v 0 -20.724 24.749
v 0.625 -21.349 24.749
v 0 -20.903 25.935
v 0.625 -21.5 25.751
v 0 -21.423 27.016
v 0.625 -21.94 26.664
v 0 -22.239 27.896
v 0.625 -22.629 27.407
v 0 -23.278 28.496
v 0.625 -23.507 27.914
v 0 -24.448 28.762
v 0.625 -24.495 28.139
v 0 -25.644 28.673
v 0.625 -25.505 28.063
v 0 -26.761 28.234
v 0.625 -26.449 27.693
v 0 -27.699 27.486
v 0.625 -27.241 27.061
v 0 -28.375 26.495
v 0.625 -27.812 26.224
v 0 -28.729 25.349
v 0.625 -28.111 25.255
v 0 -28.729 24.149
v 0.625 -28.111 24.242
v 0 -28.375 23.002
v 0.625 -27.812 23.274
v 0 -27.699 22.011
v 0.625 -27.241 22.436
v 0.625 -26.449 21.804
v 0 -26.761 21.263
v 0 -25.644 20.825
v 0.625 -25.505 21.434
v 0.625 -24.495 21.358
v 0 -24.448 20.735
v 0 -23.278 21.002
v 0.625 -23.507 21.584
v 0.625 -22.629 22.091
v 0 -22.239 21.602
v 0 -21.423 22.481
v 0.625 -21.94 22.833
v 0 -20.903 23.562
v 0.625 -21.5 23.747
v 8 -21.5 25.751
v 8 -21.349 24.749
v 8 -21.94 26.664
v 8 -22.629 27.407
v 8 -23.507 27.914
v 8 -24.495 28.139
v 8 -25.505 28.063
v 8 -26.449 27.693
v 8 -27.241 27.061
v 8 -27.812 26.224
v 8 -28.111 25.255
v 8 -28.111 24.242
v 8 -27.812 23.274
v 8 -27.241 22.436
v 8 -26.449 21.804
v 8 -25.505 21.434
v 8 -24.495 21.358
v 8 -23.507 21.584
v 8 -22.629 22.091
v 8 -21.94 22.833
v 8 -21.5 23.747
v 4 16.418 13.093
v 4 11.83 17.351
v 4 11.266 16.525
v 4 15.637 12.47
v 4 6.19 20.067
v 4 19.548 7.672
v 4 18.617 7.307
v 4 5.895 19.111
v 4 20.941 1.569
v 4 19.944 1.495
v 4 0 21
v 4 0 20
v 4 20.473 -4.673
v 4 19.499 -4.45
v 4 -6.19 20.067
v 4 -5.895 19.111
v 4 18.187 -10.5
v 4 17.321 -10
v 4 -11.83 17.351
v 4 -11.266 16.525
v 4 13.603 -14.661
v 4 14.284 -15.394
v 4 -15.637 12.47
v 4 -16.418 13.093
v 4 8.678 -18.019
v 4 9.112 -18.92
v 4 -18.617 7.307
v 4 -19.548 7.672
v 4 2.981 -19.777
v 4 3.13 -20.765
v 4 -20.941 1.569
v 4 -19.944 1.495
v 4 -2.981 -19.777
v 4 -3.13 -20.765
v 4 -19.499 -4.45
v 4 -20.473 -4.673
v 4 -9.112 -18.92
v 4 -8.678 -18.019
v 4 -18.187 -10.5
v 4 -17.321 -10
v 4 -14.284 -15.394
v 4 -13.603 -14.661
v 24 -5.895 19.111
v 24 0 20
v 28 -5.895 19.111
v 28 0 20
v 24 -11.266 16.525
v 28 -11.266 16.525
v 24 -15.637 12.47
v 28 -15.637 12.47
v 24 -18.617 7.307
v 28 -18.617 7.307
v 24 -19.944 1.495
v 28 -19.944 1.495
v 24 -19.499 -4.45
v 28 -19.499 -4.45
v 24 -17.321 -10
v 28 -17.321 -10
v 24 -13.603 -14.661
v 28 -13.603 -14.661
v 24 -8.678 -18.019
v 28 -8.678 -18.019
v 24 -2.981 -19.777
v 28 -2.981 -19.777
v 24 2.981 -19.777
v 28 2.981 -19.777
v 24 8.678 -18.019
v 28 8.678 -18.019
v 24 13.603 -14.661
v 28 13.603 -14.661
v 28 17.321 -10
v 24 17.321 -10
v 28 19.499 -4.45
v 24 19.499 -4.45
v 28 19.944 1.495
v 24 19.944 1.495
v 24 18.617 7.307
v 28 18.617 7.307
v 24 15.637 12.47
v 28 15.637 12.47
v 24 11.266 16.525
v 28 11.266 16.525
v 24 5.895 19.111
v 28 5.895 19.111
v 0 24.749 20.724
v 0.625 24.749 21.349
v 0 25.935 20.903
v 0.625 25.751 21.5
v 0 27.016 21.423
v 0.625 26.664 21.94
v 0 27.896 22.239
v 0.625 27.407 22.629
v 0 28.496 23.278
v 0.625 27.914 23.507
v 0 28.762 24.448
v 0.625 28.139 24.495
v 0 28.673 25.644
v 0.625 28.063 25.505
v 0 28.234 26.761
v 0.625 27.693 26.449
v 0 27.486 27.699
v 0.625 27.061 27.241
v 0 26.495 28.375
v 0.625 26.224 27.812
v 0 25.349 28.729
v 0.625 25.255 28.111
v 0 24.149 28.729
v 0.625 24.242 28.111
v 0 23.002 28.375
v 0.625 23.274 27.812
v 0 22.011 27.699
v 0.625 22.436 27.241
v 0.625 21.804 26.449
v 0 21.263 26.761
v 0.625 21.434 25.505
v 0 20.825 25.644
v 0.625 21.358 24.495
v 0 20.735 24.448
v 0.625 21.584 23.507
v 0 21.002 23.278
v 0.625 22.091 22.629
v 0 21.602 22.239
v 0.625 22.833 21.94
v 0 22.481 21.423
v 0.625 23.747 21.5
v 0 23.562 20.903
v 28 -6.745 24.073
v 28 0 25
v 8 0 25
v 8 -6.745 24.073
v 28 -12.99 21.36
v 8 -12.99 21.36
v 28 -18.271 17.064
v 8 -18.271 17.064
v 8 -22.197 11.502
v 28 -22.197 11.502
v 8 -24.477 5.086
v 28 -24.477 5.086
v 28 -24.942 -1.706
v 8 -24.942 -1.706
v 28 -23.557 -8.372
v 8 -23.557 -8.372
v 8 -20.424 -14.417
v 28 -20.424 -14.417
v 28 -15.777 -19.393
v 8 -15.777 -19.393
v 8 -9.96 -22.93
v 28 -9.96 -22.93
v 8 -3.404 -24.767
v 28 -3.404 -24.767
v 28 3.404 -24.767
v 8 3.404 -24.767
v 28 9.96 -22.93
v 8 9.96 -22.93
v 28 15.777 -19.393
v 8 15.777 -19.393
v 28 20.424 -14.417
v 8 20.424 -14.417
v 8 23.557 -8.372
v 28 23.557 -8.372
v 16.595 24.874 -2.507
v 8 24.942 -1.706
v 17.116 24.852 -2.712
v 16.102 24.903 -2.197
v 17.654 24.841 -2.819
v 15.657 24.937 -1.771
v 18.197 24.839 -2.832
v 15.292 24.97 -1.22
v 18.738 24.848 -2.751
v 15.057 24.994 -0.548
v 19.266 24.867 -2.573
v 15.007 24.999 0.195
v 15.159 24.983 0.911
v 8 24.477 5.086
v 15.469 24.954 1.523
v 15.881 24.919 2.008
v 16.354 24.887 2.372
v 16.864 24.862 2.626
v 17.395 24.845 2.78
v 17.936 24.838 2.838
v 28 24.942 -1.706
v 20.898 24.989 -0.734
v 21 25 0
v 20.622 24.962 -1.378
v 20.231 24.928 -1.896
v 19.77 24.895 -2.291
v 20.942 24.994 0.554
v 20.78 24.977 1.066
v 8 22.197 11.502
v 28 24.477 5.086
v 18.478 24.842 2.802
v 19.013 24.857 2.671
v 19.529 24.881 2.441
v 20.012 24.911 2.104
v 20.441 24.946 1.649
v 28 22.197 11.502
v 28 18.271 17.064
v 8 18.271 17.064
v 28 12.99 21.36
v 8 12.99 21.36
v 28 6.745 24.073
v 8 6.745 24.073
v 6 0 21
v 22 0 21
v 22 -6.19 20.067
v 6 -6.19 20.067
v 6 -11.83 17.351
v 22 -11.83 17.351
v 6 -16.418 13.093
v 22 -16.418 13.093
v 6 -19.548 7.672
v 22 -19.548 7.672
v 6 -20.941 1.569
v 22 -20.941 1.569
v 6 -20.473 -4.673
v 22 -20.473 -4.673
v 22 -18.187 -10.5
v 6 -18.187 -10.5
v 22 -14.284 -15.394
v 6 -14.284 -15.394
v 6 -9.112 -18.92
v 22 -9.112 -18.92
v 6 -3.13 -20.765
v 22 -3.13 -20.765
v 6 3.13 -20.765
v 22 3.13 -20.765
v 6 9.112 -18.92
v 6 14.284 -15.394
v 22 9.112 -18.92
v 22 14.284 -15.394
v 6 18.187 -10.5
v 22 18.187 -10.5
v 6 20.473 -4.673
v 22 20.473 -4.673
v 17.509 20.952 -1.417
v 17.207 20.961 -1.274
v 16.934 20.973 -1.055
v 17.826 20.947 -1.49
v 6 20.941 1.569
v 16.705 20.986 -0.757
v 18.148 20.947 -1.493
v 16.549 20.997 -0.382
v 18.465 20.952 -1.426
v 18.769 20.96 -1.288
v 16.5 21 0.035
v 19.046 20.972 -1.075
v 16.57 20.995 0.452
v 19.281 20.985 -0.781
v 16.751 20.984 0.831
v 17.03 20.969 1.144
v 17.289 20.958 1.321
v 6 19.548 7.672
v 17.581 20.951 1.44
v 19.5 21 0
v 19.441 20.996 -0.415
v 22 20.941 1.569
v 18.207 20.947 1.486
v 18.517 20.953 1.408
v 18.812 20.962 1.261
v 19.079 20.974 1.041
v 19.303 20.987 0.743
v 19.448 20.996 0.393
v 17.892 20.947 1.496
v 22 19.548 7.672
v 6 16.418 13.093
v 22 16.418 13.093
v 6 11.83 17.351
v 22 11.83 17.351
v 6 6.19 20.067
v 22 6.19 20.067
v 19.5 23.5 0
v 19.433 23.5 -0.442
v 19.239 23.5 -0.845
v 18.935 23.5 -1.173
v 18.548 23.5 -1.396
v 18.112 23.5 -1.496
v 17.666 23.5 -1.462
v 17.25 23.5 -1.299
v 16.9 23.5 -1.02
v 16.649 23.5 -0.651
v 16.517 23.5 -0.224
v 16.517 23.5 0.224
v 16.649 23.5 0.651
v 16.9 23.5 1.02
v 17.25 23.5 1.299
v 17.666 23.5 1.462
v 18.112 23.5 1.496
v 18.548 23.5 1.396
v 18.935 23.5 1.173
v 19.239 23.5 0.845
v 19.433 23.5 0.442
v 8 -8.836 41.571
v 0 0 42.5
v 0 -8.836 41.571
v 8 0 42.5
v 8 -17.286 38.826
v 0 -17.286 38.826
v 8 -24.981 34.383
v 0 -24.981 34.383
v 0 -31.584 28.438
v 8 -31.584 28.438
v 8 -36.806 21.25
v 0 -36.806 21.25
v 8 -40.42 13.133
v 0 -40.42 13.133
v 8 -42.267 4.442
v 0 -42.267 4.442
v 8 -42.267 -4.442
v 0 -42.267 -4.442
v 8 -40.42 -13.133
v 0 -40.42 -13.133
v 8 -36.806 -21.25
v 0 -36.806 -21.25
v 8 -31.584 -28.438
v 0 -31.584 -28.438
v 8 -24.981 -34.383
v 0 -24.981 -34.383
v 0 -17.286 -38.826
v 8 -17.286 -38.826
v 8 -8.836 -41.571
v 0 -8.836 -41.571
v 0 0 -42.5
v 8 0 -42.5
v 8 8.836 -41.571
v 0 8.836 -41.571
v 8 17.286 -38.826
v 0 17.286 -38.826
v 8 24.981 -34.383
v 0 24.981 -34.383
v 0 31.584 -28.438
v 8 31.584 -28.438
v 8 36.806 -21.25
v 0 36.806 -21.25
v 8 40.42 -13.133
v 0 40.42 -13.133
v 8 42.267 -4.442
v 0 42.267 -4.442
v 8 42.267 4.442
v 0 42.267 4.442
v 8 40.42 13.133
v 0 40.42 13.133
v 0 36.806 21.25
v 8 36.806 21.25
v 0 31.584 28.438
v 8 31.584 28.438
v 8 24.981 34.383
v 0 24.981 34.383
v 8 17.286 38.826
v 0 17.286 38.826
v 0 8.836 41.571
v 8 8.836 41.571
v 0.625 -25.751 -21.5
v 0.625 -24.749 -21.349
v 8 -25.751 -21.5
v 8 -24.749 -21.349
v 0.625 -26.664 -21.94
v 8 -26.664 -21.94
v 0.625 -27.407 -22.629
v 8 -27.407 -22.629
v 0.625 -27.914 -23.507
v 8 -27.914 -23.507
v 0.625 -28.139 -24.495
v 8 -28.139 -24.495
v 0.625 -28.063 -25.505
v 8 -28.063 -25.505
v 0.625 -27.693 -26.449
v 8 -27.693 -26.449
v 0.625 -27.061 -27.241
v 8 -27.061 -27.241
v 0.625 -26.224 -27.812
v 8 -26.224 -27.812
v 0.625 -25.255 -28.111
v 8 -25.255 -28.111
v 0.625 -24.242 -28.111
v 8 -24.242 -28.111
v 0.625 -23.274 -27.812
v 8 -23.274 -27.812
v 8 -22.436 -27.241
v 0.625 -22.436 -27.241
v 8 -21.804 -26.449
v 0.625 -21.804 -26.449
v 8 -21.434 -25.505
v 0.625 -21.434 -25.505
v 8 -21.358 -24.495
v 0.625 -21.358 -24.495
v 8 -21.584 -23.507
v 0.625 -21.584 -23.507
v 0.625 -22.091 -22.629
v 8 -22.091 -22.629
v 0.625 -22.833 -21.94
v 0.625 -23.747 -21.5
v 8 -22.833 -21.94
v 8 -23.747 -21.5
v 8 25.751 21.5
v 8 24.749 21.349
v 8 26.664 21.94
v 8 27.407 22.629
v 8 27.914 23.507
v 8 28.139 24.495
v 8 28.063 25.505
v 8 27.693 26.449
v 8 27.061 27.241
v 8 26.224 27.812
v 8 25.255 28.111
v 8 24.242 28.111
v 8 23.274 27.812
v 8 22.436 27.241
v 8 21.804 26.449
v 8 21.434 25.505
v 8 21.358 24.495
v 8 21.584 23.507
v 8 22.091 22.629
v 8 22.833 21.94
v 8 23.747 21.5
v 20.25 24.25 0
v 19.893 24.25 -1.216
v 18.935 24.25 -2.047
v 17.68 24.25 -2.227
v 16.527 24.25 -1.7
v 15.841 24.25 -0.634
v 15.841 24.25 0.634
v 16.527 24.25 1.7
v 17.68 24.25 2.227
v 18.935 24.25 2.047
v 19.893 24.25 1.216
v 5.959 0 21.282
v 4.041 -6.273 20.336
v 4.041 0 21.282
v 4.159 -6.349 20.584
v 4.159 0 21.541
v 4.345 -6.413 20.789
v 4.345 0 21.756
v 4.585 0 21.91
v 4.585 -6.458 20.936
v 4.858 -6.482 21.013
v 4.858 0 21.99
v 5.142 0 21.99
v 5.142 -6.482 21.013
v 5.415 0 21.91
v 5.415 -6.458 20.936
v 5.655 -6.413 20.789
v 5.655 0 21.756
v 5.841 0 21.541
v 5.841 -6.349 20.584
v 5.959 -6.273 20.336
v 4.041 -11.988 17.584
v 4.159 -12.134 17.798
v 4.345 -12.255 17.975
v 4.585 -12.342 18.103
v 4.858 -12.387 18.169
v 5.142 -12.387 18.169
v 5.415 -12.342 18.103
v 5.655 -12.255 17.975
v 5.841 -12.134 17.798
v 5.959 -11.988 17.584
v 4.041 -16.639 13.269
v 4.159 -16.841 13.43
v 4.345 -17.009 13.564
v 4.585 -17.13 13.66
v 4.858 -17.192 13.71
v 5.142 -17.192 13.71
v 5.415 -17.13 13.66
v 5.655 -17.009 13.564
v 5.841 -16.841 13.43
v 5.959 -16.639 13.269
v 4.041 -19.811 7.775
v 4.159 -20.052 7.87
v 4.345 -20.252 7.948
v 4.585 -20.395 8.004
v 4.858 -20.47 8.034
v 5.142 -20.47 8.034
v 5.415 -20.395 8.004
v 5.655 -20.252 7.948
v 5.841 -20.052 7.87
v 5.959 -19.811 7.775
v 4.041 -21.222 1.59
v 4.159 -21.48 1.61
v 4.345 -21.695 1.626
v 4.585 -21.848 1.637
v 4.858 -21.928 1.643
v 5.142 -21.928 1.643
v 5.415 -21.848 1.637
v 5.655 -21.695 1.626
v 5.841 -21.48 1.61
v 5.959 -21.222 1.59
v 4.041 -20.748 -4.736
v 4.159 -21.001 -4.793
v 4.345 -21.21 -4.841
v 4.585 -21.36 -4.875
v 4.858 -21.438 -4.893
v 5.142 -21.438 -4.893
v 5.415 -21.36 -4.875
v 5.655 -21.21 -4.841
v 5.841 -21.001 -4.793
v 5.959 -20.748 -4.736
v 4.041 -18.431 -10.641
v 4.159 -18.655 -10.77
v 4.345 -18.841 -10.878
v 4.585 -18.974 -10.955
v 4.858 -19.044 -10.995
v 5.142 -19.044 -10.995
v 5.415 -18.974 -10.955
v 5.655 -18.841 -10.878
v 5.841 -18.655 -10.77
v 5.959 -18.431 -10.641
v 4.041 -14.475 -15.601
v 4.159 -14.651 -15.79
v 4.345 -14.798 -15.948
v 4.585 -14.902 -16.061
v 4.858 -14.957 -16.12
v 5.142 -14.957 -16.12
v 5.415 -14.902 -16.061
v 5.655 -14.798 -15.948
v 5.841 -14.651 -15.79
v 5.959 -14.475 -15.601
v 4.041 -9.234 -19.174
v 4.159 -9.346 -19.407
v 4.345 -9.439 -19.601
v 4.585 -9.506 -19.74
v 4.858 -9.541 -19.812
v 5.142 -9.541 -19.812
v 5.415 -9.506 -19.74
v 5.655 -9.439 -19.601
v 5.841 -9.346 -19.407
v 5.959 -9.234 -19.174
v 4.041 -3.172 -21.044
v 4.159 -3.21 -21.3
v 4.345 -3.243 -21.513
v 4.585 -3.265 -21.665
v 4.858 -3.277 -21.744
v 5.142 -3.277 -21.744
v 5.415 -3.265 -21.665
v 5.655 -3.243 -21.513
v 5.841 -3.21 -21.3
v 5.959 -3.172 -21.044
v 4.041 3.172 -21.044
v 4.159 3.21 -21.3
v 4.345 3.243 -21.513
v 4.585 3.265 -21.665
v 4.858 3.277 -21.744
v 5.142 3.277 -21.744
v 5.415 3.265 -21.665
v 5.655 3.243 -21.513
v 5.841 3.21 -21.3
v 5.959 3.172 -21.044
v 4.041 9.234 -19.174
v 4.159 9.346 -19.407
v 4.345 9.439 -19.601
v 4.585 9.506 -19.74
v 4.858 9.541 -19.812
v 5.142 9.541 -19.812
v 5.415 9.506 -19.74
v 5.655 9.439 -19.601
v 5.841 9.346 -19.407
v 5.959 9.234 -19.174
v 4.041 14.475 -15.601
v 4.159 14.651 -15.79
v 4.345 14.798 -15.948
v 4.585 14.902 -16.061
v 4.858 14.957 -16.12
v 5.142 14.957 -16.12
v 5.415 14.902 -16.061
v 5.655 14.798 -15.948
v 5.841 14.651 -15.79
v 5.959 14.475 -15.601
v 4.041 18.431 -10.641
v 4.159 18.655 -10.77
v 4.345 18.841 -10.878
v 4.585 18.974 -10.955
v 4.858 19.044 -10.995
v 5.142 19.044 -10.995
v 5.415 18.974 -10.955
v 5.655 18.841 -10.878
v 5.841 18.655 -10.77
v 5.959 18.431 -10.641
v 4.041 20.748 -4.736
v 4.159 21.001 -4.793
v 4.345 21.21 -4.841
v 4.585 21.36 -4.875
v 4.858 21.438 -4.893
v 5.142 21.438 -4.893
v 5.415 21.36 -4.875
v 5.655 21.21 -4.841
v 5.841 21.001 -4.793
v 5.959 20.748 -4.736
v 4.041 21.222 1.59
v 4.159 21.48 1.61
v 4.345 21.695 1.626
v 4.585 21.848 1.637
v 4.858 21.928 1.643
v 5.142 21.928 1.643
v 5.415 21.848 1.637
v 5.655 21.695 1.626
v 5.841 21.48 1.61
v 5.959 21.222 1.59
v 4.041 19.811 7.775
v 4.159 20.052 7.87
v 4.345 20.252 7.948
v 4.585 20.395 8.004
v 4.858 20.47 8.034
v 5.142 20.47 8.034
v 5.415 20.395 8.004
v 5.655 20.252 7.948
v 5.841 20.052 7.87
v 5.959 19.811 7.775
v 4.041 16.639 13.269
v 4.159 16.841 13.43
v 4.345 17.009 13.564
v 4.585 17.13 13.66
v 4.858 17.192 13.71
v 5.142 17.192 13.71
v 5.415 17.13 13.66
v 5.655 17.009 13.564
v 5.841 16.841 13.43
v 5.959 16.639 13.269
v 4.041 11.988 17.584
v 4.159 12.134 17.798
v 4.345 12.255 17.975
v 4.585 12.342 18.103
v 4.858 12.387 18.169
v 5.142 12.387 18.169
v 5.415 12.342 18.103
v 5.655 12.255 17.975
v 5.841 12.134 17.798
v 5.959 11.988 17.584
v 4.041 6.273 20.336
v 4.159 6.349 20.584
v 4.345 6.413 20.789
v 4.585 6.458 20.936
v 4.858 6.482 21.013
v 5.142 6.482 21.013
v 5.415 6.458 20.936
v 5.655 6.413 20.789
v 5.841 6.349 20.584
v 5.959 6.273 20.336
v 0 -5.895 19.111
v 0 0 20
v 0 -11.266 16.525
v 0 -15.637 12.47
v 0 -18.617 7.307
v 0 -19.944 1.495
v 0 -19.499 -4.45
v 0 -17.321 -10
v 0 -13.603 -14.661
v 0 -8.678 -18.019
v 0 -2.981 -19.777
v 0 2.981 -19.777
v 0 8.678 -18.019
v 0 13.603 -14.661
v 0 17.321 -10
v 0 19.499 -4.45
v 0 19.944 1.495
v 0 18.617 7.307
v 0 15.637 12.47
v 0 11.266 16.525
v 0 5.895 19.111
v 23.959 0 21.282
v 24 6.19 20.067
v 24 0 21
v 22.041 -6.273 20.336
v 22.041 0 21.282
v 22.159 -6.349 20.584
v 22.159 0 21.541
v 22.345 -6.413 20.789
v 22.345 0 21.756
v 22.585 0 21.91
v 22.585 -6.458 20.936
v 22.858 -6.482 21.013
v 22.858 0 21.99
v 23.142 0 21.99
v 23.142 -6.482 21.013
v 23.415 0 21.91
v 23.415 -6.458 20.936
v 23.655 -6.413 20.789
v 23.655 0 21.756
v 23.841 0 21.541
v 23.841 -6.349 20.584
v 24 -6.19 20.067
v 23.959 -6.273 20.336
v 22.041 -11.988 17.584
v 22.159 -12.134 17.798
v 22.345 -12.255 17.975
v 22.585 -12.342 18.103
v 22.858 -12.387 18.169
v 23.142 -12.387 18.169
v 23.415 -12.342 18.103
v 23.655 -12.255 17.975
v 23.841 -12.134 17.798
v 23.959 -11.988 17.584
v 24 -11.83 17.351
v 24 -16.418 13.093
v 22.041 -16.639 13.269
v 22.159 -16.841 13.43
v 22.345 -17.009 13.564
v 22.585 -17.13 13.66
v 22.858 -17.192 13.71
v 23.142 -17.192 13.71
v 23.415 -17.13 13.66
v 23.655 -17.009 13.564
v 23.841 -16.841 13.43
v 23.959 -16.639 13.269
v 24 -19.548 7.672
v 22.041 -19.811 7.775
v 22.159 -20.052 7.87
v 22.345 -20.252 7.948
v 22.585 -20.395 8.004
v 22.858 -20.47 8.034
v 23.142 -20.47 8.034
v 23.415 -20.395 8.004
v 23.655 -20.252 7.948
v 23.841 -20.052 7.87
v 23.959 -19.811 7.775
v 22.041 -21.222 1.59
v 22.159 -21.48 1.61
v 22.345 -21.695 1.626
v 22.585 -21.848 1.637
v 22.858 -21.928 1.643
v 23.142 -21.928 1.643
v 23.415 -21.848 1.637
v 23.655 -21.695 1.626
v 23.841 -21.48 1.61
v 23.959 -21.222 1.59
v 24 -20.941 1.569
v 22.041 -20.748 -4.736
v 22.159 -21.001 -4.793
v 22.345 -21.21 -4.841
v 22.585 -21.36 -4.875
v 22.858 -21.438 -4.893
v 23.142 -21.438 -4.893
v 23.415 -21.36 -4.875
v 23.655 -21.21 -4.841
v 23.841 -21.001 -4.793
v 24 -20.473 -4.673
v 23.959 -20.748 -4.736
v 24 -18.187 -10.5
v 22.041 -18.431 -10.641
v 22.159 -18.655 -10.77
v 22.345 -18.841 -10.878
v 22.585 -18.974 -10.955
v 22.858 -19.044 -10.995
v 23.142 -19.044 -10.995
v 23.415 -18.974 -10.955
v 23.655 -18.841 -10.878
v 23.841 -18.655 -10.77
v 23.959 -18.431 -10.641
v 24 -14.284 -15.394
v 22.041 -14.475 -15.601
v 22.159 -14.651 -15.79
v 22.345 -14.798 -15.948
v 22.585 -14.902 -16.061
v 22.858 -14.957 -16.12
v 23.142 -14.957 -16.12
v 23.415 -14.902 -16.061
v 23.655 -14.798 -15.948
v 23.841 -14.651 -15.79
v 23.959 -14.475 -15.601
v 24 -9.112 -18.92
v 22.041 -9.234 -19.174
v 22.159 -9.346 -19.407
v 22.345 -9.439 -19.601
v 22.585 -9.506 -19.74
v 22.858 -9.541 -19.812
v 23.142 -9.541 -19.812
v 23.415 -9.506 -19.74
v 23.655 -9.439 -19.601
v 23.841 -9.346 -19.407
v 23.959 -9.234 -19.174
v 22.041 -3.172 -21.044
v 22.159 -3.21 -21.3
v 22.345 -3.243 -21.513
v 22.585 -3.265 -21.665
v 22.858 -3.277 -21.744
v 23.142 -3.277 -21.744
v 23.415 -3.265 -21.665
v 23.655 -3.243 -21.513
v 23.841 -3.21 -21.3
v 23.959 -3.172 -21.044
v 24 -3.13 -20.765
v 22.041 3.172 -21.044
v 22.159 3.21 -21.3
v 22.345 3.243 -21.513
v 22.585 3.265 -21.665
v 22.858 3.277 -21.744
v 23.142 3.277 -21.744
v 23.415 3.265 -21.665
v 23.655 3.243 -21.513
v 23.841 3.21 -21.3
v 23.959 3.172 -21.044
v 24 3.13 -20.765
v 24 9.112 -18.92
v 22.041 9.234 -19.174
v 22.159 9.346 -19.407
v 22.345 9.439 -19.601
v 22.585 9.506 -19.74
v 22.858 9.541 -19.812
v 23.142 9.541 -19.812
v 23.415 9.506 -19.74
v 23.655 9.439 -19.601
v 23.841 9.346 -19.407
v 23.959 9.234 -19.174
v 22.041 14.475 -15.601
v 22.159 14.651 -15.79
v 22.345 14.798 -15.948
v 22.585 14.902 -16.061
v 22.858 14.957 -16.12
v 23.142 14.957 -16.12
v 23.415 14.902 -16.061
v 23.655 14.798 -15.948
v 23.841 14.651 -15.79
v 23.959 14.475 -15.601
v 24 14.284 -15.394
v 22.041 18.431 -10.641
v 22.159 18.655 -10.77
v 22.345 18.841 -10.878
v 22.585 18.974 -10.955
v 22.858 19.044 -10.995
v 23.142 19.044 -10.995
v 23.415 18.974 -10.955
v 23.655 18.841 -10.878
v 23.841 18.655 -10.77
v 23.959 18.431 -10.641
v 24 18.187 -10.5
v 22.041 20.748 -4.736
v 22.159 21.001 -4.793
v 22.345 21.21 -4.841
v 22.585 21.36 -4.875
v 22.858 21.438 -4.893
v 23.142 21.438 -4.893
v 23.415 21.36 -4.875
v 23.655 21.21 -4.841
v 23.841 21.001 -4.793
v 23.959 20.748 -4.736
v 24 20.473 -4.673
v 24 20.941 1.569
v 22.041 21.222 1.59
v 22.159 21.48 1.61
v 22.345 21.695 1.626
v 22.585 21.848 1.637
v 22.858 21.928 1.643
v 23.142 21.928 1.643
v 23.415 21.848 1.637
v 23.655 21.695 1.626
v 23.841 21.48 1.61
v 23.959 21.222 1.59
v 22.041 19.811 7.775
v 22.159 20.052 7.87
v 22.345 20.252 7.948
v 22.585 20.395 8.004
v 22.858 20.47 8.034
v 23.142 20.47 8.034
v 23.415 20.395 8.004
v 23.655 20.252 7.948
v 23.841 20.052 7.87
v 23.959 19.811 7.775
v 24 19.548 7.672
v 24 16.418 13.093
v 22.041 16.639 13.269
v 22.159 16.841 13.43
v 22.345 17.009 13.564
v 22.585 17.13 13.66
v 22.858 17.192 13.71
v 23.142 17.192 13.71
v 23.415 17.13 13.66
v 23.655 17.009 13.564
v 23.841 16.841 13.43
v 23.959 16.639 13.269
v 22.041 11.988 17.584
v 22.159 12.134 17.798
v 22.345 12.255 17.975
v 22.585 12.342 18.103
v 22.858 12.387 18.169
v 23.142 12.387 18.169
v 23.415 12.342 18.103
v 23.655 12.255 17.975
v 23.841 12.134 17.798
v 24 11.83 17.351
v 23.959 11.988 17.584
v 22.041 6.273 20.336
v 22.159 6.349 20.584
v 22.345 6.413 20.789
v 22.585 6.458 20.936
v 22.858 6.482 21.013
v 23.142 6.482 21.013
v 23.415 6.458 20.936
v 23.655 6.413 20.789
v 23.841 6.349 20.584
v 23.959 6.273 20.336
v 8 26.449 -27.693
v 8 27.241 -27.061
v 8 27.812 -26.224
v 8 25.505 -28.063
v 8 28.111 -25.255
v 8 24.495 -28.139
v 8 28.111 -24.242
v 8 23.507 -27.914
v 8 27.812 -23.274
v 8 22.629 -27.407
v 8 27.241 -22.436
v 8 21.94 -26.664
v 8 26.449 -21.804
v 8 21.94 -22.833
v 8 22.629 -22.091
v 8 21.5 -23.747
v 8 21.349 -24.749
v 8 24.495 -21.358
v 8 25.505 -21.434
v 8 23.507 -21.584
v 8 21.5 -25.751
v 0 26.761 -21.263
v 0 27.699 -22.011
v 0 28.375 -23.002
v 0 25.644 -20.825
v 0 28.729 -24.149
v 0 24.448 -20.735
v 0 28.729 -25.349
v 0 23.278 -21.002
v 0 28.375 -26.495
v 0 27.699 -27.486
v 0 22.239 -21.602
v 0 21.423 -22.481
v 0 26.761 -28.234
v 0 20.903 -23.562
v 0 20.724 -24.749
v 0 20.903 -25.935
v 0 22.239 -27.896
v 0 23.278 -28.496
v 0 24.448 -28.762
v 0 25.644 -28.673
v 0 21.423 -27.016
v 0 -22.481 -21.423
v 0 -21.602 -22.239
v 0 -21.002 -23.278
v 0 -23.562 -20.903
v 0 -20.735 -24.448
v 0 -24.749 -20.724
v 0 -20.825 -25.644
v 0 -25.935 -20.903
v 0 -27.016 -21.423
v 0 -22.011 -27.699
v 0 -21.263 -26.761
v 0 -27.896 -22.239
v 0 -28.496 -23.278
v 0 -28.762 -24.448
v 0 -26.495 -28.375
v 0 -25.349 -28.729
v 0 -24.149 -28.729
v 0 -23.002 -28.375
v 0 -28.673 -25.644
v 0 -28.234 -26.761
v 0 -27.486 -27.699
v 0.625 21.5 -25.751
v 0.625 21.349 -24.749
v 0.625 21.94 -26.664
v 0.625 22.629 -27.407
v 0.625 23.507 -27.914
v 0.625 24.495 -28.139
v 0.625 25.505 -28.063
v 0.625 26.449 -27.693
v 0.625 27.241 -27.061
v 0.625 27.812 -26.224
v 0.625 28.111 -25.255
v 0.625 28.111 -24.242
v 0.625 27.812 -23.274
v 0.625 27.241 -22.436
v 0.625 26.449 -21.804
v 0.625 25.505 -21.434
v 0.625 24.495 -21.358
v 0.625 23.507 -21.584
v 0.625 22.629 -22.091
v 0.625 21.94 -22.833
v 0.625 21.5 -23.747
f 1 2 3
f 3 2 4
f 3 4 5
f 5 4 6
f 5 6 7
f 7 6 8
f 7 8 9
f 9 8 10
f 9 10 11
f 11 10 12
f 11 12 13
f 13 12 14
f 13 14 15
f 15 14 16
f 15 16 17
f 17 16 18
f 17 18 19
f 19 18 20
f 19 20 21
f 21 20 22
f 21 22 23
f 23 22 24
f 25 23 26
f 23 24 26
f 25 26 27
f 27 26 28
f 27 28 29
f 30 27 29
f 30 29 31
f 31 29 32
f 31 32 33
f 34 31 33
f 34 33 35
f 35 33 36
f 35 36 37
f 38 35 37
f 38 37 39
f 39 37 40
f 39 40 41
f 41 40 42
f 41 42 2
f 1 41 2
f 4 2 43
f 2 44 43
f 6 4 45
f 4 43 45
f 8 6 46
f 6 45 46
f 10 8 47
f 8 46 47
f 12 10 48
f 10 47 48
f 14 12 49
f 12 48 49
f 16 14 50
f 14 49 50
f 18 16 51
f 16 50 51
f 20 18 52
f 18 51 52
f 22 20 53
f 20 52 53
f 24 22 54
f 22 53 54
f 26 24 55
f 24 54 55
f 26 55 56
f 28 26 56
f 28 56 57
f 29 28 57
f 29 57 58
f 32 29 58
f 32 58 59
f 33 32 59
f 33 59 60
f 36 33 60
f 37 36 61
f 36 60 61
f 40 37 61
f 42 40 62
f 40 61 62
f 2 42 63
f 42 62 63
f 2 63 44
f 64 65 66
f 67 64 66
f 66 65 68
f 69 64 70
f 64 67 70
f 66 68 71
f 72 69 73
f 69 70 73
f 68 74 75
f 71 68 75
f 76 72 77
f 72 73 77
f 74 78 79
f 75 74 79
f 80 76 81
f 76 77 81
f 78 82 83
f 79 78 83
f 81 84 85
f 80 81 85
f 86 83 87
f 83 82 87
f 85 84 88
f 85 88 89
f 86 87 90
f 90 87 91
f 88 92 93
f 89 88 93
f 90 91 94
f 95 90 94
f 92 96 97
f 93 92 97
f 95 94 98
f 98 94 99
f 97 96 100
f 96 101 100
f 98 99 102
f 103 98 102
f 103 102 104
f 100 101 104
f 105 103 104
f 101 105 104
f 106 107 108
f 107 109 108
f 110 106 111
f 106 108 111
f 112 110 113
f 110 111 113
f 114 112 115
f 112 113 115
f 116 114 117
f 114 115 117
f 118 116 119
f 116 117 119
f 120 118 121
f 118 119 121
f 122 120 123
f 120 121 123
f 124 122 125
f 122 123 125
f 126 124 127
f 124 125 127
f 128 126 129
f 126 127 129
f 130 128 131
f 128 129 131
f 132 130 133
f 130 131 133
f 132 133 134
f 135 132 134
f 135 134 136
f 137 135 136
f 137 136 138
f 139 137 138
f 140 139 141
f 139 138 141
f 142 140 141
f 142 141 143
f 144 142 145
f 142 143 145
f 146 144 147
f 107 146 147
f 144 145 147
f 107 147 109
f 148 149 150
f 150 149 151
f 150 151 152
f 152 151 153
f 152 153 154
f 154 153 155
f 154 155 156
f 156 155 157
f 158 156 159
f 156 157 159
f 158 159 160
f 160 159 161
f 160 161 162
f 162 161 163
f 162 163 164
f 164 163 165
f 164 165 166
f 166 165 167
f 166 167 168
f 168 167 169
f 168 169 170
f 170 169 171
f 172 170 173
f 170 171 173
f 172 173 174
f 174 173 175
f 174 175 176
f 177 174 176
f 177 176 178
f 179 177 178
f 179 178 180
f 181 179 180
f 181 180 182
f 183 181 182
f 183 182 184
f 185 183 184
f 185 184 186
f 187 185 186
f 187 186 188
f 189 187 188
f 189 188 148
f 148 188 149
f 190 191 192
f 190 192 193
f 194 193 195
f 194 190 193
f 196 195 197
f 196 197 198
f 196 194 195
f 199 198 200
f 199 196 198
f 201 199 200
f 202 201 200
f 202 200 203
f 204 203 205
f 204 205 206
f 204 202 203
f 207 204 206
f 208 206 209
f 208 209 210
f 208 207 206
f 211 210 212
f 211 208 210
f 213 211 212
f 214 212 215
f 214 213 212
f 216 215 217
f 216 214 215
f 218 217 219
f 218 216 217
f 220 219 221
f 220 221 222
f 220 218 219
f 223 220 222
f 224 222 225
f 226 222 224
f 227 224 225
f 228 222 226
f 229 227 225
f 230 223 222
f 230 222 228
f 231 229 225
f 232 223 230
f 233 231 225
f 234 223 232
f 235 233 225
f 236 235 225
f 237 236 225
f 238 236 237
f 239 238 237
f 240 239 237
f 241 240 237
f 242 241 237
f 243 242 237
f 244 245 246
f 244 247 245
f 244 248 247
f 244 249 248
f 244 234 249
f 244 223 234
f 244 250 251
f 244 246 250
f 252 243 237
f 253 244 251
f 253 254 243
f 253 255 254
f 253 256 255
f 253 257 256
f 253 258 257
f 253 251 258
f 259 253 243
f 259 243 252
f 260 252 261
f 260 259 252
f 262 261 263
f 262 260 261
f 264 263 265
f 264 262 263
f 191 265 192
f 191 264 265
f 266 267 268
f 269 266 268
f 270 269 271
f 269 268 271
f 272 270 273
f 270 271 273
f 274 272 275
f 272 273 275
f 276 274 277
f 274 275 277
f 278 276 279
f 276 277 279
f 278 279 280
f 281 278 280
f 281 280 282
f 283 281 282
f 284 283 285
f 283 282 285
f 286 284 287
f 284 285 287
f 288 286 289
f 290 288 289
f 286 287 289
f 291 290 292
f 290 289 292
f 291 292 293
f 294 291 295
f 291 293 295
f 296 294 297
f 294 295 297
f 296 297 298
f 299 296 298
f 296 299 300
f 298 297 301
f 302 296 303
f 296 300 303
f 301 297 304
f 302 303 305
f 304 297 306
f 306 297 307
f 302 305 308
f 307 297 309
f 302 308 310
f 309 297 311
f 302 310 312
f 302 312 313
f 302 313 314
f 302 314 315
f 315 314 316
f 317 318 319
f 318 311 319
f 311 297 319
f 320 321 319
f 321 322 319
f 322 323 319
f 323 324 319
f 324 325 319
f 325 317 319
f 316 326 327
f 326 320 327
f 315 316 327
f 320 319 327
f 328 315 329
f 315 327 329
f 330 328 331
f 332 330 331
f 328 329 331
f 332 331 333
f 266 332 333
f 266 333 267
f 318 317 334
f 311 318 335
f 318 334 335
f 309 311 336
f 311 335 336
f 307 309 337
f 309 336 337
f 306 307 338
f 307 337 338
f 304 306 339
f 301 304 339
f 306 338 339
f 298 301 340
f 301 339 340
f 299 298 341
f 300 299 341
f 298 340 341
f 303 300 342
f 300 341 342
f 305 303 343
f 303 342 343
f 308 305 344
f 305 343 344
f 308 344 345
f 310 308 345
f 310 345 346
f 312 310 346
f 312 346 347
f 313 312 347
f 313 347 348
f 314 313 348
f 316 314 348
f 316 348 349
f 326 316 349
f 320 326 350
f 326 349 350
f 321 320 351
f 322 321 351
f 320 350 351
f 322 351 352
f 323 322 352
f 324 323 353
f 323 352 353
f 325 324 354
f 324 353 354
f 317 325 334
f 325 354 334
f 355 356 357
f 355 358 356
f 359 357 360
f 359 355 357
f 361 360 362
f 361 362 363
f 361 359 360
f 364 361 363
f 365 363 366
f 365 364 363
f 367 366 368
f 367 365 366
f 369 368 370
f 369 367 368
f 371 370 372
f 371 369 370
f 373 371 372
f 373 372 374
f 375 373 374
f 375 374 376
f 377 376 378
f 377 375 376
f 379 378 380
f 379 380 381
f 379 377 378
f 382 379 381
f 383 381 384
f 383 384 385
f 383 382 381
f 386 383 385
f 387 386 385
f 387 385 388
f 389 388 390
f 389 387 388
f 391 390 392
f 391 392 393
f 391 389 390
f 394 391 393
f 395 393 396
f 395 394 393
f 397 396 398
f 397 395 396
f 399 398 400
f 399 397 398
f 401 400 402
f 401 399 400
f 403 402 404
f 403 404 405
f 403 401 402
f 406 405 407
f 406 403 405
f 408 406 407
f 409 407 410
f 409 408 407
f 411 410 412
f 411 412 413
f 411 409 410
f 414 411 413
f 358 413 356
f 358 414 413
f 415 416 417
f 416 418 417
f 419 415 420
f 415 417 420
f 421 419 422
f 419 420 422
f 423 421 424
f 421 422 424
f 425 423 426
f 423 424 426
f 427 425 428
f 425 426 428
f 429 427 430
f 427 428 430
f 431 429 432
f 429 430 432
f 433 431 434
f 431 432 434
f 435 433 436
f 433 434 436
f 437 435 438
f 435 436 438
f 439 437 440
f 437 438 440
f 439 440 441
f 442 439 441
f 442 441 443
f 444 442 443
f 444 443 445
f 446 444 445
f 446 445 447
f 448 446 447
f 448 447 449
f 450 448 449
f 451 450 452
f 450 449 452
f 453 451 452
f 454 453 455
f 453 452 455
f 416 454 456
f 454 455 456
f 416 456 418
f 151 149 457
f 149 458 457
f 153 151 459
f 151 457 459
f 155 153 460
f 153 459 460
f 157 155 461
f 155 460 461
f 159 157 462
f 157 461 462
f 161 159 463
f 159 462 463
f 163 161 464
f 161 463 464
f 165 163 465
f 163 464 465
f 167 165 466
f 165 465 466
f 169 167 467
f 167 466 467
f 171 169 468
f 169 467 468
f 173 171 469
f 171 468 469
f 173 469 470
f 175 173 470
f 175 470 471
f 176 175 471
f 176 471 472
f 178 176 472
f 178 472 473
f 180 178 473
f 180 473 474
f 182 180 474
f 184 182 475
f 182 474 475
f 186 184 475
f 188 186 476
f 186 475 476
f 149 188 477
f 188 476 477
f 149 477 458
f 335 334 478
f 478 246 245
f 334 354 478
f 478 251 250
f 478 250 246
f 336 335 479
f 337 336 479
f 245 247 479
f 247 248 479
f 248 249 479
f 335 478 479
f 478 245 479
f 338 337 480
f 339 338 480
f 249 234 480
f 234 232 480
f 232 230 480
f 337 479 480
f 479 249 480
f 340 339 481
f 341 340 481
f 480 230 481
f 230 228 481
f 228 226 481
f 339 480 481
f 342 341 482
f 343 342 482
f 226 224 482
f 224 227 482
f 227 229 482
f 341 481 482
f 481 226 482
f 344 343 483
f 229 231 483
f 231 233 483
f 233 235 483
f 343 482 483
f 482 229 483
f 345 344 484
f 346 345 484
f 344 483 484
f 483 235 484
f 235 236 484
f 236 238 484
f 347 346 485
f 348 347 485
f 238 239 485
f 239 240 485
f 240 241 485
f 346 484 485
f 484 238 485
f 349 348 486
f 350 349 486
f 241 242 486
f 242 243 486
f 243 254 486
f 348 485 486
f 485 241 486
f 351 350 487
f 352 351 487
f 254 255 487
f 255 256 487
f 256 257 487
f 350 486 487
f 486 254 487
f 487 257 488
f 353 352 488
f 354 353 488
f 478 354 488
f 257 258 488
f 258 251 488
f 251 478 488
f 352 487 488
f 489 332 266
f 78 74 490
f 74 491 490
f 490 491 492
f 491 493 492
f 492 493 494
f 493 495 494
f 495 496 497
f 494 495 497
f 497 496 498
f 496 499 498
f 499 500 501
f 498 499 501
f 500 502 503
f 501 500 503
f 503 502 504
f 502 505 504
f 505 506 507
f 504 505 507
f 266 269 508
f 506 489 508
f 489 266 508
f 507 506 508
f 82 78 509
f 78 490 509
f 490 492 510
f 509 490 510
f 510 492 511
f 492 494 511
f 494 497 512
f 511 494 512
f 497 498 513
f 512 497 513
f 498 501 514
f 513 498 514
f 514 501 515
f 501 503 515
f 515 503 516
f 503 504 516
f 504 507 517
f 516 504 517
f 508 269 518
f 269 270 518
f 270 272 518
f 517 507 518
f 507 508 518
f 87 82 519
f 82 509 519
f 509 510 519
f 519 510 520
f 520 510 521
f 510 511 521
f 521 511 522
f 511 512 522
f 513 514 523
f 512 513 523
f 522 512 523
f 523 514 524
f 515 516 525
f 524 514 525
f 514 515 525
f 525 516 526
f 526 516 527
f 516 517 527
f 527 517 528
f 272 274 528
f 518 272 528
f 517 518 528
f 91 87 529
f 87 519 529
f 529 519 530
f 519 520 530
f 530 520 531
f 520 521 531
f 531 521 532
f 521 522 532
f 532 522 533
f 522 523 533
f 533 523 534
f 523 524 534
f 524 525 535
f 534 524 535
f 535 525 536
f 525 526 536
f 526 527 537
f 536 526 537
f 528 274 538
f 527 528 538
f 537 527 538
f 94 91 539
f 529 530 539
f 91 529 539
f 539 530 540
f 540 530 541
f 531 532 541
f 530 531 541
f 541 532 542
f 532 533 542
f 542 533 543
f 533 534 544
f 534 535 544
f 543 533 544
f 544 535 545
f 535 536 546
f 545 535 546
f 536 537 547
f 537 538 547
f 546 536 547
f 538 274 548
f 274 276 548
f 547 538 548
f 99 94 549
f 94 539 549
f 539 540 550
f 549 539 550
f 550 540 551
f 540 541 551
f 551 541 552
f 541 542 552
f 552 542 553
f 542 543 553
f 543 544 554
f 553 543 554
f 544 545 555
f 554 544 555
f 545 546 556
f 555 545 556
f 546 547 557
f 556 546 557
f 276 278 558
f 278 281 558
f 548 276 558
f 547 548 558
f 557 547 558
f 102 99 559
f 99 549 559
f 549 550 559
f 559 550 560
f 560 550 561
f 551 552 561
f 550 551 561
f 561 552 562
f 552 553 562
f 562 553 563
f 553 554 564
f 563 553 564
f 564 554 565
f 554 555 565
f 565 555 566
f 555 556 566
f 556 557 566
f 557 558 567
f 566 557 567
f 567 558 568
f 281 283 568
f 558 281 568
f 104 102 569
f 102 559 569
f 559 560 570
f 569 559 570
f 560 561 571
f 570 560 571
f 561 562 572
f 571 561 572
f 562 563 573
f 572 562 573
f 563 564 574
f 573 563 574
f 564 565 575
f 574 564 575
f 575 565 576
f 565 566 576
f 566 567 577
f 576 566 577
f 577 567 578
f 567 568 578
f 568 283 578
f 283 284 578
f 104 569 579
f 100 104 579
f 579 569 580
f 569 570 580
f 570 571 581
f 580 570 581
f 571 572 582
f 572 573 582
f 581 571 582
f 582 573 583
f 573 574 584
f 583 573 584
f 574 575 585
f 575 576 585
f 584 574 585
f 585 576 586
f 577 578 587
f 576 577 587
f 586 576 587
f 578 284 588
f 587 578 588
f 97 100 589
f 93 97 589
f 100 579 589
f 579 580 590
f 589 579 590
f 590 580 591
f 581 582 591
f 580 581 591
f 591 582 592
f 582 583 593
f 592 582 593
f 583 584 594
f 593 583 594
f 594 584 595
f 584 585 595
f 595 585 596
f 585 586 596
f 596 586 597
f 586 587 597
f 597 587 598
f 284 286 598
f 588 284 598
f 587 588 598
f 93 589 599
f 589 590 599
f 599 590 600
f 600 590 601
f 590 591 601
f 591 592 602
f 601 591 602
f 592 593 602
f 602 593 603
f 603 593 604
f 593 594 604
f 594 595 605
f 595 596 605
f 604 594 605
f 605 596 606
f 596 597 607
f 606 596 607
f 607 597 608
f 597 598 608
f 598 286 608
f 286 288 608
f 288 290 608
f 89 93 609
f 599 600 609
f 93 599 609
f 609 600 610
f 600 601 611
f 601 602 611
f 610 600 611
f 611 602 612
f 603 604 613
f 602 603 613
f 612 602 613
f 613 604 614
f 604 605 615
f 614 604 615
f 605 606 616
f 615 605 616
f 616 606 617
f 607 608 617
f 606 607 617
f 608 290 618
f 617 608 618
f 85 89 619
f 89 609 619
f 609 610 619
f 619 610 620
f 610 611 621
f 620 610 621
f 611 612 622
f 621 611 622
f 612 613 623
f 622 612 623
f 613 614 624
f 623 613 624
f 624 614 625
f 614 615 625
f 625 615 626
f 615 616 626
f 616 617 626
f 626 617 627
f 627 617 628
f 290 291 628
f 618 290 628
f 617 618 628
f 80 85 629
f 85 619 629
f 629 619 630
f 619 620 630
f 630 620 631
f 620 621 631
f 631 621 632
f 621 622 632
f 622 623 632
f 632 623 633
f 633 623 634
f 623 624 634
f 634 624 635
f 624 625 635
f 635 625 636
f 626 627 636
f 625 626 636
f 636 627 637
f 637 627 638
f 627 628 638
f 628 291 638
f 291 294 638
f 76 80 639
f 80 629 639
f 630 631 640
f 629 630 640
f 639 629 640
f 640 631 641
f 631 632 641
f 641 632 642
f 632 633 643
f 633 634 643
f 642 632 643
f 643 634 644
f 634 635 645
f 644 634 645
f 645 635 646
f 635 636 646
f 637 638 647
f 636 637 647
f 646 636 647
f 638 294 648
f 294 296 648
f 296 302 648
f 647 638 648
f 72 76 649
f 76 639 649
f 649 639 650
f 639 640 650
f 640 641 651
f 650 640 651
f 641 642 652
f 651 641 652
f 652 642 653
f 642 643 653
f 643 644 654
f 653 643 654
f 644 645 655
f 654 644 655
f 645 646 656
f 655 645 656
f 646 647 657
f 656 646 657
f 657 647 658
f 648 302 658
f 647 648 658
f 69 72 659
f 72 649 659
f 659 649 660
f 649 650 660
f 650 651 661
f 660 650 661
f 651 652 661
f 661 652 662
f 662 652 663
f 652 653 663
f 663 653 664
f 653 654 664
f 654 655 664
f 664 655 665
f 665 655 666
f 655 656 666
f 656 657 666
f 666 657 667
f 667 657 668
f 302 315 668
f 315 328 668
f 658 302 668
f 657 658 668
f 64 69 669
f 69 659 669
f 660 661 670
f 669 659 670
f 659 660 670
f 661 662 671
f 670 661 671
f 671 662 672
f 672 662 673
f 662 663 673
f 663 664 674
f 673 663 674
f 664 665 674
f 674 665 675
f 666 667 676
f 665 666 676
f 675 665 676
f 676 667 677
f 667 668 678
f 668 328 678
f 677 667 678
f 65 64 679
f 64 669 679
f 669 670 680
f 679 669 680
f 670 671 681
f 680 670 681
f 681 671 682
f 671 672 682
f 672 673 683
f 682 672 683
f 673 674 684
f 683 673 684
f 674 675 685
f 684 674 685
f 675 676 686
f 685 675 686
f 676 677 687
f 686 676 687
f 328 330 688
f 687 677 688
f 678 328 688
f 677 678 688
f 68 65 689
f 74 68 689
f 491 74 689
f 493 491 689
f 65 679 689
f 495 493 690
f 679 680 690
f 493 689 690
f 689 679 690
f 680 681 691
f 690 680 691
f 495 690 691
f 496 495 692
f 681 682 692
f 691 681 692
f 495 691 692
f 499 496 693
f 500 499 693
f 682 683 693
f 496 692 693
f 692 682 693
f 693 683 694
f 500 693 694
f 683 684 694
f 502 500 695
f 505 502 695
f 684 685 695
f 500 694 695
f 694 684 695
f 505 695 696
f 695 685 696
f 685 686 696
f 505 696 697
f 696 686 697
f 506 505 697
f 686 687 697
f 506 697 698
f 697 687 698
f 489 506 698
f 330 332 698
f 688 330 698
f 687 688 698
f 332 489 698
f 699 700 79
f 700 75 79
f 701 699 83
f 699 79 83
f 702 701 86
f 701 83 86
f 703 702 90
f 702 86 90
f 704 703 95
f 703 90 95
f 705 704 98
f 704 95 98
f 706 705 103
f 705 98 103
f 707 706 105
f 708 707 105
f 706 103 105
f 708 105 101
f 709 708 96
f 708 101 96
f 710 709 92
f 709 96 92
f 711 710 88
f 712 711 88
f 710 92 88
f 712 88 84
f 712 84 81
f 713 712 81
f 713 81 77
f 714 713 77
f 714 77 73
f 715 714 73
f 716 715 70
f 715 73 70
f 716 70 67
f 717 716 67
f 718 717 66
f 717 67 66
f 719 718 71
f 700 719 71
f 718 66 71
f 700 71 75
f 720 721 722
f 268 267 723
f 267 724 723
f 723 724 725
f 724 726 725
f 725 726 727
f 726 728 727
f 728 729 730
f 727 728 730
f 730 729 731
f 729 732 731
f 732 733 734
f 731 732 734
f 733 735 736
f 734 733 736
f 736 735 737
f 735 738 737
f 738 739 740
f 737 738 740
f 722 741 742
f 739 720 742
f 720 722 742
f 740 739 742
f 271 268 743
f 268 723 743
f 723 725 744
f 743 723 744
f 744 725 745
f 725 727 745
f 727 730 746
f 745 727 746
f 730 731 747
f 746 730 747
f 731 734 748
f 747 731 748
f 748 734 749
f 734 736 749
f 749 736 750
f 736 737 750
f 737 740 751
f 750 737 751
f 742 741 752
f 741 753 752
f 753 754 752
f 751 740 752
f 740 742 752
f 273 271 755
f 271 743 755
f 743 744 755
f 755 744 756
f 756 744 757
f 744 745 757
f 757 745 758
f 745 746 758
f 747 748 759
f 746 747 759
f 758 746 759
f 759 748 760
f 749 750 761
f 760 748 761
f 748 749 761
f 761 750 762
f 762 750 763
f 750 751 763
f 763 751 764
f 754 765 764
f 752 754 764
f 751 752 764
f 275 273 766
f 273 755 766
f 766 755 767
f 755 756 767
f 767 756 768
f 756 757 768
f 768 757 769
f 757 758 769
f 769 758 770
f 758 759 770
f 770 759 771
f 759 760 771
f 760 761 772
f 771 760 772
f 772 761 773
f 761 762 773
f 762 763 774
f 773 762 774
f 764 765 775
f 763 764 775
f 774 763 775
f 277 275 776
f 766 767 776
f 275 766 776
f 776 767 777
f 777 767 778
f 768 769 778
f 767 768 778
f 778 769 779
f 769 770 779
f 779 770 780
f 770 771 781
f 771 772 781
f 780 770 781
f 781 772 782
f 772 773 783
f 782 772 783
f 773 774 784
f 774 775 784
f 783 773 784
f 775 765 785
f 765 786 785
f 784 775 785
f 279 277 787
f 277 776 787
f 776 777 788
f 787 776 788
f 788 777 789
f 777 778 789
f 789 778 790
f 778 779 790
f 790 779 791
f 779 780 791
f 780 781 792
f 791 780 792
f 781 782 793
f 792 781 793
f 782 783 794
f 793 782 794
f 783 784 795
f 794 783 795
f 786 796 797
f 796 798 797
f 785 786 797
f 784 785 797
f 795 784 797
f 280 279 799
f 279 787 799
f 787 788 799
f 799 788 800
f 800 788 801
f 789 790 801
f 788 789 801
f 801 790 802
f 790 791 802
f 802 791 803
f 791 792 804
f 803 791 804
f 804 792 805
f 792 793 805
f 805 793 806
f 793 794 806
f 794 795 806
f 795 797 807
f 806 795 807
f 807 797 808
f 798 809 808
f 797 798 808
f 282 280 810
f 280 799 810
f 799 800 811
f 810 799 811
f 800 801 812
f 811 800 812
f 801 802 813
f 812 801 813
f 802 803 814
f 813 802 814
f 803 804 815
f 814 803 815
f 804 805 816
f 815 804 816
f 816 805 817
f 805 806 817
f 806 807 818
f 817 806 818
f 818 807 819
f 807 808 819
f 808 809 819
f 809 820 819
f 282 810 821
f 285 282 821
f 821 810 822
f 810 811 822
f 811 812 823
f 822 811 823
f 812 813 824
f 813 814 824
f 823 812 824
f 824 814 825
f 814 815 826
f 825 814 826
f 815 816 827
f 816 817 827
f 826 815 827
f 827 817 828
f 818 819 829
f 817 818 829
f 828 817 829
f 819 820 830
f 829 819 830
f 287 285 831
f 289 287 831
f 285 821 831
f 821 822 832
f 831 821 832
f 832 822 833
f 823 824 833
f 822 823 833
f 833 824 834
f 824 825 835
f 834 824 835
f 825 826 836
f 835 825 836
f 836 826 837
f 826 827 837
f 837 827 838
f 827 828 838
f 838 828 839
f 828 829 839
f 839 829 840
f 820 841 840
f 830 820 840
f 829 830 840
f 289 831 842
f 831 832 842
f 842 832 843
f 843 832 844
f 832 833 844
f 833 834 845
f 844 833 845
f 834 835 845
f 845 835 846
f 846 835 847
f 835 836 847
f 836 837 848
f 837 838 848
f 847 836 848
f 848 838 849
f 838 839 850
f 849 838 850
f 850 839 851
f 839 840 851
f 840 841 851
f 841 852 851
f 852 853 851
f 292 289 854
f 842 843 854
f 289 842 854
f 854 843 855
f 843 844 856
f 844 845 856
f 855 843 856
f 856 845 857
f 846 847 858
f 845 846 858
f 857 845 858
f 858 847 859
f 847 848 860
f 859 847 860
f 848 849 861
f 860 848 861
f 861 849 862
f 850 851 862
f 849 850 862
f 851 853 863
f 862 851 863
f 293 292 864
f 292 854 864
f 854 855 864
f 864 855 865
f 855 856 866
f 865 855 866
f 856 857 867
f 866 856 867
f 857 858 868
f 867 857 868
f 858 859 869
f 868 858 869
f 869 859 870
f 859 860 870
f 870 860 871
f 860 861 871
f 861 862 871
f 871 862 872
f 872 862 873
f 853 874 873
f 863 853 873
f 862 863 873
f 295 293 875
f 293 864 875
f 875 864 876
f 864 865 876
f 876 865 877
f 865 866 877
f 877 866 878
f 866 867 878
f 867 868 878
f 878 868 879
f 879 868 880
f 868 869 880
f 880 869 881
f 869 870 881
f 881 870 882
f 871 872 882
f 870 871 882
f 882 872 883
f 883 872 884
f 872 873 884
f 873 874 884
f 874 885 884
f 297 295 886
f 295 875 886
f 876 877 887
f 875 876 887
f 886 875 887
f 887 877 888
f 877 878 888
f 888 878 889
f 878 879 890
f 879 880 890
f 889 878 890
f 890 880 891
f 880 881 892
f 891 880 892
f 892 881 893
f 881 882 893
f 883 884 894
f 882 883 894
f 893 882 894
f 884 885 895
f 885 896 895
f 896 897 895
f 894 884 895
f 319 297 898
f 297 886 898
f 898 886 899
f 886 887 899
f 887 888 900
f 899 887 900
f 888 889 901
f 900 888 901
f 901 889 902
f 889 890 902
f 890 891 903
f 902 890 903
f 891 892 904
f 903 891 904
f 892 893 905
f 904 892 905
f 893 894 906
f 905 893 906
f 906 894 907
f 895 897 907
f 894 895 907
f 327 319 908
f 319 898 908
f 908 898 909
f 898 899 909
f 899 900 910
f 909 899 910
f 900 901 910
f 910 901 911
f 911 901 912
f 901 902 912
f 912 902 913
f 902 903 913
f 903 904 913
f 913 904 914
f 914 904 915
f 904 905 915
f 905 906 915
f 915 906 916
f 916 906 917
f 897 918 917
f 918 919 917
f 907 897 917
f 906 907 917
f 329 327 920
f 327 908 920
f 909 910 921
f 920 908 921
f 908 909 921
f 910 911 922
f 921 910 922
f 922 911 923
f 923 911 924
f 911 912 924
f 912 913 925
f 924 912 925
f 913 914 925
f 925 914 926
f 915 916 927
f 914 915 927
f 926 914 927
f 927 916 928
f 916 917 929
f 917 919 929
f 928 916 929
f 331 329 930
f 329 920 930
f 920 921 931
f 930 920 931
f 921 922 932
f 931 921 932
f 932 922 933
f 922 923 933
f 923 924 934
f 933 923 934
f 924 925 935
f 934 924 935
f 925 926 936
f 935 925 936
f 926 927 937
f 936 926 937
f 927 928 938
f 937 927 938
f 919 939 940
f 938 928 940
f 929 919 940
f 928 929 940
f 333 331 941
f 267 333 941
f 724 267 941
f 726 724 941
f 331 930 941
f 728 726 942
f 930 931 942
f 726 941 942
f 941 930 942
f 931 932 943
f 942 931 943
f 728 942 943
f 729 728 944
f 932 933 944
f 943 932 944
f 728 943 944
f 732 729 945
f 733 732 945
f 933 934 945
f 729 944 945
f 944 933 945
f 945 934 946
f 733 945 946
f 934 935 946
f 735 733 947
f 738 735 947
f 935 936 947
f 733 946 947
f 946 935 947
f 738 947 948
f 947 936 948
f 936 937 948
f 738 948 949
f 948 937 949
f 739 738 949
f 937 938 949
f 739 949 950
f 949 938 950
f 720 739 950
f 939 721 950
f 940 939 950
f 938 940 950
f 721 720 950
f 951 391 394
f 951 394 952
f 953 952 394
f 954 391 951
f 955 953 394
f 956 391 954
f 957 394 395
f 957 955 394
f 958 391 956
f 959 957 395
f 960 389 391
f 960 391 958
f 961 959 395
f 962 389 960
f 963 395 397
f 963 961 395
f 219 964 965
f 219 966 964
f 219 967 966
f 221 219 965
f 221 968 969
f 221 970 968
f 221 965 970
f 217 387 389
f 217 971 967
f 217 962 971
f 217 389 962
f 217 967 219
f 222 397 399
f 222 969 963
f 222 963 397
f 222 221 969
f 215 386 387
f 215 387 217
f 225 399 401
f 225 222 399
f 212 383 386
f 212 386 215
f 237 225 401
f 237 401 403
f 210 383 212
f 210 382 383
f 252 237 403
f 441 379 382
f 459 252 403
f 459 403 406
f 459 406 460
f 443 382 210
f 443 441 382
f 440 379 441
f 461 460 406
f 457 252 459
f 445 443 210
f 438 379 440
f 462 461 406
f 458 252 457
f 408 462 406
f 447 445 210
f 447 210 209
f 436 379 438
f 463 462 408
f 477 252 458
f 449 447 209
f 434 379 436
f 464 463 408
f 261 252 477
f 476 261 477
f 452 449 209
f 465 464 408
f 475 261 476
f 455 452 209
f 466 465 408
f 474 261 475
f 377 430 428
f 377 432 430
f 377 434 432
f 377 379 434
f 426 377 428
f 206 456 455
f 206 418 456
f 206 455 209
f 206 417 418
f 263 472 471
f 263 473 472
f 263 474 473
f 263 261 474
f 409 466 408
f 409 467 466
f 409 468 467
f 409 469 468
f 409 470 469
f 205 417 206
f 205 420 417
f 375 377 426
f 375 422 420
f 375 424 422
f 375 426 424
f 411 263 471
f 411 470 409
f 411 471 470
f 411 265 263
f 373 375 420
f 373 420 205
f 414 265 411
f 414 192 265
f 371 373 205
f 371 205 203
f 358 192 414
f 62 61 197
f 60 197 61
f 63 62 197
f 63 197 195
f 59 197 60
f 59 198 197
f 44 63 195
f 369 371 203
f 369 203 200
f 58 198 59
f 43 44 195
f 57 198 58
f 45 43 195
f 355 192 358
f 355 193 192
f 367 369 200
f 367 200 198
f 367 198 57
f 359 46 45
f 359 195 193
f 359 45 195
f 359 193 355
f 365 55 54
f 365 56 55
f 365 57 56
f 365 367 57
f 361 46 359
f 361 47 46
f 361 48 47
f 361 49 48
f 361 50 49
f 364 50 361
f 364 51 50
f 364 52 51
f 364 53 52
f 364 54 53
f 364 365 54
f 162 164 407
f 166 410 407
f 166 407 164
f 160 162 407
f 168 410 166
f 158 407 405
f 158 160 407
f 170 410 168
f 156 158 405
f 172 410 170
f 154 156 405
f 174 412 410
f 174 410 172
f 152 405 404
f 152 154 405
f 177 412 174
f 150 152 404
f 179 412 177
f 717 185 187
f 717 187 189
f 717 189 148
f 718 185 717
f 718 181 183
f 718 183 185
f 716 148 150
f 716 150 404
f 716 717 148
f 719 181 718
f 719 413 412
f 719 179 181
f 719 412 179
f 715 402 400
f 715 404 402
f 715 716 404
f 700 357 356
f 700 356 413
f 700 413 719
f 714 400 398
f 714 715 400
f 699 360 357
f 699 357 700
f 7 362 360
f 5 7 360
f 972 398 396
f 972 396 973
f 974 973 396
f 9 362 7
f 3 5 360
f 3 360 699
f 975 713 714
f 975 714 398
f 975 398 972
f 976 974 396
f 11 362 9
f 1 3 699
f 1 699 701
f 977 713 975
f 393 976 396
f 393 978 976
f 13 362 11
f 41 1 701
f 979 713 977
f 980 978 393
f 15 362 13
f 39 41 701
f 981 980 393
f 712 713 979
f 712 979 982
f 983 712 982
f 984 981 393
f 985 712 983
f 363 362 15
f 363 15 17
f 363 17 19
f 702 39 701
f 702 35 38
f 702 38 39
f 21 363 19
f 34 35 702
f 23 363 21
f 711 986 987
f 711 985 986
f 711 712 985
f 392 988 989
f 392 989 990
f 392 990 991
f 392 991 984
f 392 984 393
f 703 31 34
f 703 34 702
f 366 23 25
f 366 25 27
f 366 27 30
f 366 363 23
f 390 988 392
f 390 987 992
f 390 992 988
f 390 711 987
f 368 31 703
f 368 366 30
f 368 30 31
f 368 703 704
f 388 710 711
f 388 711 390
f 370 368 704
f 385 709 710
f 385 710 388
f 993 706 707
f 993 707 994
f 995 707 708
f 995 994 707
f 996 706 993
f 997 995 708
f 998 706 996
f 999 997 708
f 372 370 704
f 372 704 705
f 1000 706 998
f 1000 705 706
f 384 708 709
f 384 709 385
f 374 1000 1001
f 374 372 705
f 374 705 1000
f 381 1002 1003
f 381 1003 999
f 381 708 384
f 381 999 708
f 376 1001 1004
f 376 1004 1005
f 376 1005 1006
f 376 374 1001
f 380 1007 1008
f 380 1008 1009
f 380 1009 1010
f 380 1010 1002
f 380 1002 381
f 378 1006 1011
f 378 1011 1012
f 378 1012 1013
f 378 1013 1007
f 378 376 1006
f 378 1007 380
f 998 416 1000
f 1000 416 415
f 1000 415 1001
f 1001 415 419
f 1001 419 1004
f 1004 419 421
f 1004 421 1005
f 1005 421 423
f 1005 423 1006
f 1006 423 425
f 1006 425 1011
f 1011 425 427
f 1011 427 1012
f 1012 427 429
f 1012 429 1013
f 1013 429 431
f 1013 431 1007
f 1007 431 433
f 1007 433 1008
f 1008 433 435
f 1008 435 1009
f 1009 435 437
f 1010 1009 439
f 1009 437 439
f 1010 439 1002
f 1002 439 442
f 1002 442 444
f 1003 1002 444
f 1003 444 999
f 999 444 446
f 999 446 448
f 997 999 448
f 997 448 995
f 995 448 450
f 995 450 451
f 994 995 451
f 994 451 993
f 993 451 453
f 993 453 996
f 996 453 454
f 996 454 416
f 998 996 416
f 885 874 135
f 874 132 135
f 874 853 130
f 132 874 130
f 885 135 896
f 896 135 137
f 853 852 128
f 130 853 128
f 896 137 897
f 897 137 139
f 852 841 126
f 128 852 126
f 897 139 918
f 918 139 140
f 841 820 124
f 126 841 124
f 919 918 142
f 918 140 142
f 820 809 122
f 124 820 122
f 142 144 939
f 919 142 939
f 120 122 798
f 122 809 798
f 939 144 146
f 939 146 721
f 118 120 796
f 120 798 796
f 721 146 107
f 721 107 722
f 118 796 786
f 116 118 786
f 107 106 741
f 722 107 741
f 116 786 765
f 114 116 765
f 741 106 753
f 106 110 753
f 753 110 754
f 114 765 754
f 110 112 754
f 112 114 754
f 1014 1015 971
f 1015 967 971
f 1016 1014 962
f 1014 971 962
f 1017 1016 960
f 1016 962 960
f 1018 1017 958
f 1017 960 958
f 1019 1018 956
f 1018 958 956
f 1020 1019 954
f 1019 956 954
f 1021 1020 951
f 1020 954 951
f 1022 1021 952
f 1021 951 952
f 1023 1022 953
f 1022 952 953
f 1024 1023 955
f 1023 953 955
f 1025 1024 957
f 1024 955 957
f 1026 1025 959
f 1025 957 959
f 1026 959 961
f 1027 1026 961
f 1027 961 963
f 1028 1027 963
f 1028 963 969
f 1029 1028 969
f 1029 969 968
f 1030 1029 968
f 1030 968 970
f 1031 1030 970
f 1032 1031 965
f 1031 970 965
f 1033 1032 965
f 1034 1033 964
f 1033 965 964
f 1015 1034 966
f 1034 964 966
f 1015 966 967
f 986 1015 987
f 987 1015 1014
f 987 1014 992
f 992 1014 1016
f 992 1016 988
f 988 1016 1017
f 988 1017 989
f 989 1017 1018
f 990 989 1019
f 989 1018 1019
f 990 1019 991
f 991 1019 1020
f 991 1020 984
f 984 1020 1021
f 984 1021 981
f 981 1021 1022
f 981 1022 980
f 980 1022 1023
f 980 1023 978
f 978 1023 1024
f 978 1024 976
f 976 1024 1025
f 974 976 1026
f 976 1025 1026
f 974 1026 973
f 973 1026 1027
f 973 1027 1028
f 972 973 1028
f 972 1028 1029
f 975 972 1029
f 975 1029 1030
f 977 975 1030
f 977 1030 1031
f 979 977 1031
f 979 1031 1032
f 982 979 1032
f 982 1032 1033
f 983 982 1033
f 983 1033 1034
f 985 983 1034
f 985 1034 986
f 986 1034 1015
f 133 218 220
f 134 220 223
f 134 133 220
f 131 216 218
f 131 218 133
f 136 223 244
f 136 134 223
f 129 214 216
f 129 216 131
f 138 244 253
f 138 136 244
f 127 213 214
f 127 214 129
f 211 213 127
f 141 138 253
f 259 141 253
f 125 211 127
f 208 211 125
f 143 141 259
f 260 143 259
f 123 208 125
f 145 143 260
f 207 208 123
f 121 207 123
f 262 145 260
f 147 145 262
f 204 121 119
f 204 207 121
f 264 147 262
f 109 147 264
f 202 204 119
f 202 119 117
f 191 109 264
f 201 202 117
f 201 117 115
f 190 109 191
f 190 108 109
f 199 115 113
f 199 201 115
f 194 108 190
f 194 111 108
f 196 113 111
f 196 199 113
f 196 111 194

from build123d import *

# Parameters (mm, degrees)
HOLE_WIZARD_M8_1_D           = 6.8
HOLE_WIZARD_M8_1_CSINK_D     = 8.05
HOLE_WIZARD_M8_1_CSINK_ANGLE = 90
PATTERN_CIRCULAR_1_COUNT     = 4


# Read off the part's stored shape, not the designer's step: Ø3.0mm 暗销孔1
with BuildPart() as part:
    # 草图1 → 旋转1 (revolve)
    with BuildSketch(Plane.XY, mode=Mode.PRIVATE) as revolve_1_sk:
        Polygon((0, 0), (0, 42.5), (8, 42.5), (8, 25), (28, 25), (28, 0), align=None)
    revolve(revolve_1_sk.sketch.rotate(Axis((0, 0, 0), (1, 0, 0)), 90), axis=Axis((0, 0, 0), (1, 0, 0)))

    # 草图2 → 切除-旋转1 (revolve, cut)
    with BuildSketch(Plane.XY, mode=Mode.PRIVATE) as cut_revolve_1_sk:
        with BuildLine():
            Line((0, 0), (0, 20))
            Line((0, 20), (4, 20))
            Line((4, 20), (4, 21))
            ThreePointArc((4, 21), (5, 22), (6, 21))
            Line((6, 21), (22, 21))
            ThreePointArc((22, 21), (23, 22), (24, 21))
            Line((24, 21), (24, 20))
            Line((24, 20), (28, 20))
            Line((28, 20), (28, 0))
            Line((28, 0), (0, 0))
        make_face()
    revolve(cut_revolve_1_sk.sketch.rotate(Axis((0, 0, 0), (1, 0, 0)), 90), axis=Axis((0, 0, 0), (1, 0, 0)), mode=Mode.SUBTRACT)

    # Ø3.0mm 暗销孔1 outline → Ø3.0mm 暗销孔1 (revolve, cut)
    with BuildSketch(Plane(origin=(18, 0, 0), x_dir=(1, 0, 0), z_dir=(0, 0, 1))):
        Polygon((3.000038896, 25.000038896), (0, 25.000038896), (0, 20.946331159), (1.5, 20.946331159), (1.5, 23.5), align=None)
    revolve(axis=Axis((18, 0, 0), (0, 1, 0)), mode=Mode.SUBTRACT)

    # M8 螺纹孔1 (through all)
    with Locations(Plane.ZY):
        with Locations((24.748737342, 24.748737342)):
            hole_wizard_m8_1 = CounterSinkHole(HOLE_WIZARD_M8_1_D / 2, HOLE_WIZARD_M8_1_CSINK_D / 2, counter_sink_angle=HOLE_WIZARD_M8_1_CSINK_ANGLE)

    # 阵列(圆周)1: M8 螺纹孔1 ×4 about axis
    pattern_circular_1_axis = Axis((0, 0, 0), (1, 0, 0))
    for i in range(1, PATTERN_CIRCULAR_1_COUNT):
        add(hole_wizard_m8_1.rotate(pattern_circular_1_axis, i * 360 / PATTERN_CIRCULAR_1_COUNT), mode=Mode.SUBTRACT)


solid = part.part
